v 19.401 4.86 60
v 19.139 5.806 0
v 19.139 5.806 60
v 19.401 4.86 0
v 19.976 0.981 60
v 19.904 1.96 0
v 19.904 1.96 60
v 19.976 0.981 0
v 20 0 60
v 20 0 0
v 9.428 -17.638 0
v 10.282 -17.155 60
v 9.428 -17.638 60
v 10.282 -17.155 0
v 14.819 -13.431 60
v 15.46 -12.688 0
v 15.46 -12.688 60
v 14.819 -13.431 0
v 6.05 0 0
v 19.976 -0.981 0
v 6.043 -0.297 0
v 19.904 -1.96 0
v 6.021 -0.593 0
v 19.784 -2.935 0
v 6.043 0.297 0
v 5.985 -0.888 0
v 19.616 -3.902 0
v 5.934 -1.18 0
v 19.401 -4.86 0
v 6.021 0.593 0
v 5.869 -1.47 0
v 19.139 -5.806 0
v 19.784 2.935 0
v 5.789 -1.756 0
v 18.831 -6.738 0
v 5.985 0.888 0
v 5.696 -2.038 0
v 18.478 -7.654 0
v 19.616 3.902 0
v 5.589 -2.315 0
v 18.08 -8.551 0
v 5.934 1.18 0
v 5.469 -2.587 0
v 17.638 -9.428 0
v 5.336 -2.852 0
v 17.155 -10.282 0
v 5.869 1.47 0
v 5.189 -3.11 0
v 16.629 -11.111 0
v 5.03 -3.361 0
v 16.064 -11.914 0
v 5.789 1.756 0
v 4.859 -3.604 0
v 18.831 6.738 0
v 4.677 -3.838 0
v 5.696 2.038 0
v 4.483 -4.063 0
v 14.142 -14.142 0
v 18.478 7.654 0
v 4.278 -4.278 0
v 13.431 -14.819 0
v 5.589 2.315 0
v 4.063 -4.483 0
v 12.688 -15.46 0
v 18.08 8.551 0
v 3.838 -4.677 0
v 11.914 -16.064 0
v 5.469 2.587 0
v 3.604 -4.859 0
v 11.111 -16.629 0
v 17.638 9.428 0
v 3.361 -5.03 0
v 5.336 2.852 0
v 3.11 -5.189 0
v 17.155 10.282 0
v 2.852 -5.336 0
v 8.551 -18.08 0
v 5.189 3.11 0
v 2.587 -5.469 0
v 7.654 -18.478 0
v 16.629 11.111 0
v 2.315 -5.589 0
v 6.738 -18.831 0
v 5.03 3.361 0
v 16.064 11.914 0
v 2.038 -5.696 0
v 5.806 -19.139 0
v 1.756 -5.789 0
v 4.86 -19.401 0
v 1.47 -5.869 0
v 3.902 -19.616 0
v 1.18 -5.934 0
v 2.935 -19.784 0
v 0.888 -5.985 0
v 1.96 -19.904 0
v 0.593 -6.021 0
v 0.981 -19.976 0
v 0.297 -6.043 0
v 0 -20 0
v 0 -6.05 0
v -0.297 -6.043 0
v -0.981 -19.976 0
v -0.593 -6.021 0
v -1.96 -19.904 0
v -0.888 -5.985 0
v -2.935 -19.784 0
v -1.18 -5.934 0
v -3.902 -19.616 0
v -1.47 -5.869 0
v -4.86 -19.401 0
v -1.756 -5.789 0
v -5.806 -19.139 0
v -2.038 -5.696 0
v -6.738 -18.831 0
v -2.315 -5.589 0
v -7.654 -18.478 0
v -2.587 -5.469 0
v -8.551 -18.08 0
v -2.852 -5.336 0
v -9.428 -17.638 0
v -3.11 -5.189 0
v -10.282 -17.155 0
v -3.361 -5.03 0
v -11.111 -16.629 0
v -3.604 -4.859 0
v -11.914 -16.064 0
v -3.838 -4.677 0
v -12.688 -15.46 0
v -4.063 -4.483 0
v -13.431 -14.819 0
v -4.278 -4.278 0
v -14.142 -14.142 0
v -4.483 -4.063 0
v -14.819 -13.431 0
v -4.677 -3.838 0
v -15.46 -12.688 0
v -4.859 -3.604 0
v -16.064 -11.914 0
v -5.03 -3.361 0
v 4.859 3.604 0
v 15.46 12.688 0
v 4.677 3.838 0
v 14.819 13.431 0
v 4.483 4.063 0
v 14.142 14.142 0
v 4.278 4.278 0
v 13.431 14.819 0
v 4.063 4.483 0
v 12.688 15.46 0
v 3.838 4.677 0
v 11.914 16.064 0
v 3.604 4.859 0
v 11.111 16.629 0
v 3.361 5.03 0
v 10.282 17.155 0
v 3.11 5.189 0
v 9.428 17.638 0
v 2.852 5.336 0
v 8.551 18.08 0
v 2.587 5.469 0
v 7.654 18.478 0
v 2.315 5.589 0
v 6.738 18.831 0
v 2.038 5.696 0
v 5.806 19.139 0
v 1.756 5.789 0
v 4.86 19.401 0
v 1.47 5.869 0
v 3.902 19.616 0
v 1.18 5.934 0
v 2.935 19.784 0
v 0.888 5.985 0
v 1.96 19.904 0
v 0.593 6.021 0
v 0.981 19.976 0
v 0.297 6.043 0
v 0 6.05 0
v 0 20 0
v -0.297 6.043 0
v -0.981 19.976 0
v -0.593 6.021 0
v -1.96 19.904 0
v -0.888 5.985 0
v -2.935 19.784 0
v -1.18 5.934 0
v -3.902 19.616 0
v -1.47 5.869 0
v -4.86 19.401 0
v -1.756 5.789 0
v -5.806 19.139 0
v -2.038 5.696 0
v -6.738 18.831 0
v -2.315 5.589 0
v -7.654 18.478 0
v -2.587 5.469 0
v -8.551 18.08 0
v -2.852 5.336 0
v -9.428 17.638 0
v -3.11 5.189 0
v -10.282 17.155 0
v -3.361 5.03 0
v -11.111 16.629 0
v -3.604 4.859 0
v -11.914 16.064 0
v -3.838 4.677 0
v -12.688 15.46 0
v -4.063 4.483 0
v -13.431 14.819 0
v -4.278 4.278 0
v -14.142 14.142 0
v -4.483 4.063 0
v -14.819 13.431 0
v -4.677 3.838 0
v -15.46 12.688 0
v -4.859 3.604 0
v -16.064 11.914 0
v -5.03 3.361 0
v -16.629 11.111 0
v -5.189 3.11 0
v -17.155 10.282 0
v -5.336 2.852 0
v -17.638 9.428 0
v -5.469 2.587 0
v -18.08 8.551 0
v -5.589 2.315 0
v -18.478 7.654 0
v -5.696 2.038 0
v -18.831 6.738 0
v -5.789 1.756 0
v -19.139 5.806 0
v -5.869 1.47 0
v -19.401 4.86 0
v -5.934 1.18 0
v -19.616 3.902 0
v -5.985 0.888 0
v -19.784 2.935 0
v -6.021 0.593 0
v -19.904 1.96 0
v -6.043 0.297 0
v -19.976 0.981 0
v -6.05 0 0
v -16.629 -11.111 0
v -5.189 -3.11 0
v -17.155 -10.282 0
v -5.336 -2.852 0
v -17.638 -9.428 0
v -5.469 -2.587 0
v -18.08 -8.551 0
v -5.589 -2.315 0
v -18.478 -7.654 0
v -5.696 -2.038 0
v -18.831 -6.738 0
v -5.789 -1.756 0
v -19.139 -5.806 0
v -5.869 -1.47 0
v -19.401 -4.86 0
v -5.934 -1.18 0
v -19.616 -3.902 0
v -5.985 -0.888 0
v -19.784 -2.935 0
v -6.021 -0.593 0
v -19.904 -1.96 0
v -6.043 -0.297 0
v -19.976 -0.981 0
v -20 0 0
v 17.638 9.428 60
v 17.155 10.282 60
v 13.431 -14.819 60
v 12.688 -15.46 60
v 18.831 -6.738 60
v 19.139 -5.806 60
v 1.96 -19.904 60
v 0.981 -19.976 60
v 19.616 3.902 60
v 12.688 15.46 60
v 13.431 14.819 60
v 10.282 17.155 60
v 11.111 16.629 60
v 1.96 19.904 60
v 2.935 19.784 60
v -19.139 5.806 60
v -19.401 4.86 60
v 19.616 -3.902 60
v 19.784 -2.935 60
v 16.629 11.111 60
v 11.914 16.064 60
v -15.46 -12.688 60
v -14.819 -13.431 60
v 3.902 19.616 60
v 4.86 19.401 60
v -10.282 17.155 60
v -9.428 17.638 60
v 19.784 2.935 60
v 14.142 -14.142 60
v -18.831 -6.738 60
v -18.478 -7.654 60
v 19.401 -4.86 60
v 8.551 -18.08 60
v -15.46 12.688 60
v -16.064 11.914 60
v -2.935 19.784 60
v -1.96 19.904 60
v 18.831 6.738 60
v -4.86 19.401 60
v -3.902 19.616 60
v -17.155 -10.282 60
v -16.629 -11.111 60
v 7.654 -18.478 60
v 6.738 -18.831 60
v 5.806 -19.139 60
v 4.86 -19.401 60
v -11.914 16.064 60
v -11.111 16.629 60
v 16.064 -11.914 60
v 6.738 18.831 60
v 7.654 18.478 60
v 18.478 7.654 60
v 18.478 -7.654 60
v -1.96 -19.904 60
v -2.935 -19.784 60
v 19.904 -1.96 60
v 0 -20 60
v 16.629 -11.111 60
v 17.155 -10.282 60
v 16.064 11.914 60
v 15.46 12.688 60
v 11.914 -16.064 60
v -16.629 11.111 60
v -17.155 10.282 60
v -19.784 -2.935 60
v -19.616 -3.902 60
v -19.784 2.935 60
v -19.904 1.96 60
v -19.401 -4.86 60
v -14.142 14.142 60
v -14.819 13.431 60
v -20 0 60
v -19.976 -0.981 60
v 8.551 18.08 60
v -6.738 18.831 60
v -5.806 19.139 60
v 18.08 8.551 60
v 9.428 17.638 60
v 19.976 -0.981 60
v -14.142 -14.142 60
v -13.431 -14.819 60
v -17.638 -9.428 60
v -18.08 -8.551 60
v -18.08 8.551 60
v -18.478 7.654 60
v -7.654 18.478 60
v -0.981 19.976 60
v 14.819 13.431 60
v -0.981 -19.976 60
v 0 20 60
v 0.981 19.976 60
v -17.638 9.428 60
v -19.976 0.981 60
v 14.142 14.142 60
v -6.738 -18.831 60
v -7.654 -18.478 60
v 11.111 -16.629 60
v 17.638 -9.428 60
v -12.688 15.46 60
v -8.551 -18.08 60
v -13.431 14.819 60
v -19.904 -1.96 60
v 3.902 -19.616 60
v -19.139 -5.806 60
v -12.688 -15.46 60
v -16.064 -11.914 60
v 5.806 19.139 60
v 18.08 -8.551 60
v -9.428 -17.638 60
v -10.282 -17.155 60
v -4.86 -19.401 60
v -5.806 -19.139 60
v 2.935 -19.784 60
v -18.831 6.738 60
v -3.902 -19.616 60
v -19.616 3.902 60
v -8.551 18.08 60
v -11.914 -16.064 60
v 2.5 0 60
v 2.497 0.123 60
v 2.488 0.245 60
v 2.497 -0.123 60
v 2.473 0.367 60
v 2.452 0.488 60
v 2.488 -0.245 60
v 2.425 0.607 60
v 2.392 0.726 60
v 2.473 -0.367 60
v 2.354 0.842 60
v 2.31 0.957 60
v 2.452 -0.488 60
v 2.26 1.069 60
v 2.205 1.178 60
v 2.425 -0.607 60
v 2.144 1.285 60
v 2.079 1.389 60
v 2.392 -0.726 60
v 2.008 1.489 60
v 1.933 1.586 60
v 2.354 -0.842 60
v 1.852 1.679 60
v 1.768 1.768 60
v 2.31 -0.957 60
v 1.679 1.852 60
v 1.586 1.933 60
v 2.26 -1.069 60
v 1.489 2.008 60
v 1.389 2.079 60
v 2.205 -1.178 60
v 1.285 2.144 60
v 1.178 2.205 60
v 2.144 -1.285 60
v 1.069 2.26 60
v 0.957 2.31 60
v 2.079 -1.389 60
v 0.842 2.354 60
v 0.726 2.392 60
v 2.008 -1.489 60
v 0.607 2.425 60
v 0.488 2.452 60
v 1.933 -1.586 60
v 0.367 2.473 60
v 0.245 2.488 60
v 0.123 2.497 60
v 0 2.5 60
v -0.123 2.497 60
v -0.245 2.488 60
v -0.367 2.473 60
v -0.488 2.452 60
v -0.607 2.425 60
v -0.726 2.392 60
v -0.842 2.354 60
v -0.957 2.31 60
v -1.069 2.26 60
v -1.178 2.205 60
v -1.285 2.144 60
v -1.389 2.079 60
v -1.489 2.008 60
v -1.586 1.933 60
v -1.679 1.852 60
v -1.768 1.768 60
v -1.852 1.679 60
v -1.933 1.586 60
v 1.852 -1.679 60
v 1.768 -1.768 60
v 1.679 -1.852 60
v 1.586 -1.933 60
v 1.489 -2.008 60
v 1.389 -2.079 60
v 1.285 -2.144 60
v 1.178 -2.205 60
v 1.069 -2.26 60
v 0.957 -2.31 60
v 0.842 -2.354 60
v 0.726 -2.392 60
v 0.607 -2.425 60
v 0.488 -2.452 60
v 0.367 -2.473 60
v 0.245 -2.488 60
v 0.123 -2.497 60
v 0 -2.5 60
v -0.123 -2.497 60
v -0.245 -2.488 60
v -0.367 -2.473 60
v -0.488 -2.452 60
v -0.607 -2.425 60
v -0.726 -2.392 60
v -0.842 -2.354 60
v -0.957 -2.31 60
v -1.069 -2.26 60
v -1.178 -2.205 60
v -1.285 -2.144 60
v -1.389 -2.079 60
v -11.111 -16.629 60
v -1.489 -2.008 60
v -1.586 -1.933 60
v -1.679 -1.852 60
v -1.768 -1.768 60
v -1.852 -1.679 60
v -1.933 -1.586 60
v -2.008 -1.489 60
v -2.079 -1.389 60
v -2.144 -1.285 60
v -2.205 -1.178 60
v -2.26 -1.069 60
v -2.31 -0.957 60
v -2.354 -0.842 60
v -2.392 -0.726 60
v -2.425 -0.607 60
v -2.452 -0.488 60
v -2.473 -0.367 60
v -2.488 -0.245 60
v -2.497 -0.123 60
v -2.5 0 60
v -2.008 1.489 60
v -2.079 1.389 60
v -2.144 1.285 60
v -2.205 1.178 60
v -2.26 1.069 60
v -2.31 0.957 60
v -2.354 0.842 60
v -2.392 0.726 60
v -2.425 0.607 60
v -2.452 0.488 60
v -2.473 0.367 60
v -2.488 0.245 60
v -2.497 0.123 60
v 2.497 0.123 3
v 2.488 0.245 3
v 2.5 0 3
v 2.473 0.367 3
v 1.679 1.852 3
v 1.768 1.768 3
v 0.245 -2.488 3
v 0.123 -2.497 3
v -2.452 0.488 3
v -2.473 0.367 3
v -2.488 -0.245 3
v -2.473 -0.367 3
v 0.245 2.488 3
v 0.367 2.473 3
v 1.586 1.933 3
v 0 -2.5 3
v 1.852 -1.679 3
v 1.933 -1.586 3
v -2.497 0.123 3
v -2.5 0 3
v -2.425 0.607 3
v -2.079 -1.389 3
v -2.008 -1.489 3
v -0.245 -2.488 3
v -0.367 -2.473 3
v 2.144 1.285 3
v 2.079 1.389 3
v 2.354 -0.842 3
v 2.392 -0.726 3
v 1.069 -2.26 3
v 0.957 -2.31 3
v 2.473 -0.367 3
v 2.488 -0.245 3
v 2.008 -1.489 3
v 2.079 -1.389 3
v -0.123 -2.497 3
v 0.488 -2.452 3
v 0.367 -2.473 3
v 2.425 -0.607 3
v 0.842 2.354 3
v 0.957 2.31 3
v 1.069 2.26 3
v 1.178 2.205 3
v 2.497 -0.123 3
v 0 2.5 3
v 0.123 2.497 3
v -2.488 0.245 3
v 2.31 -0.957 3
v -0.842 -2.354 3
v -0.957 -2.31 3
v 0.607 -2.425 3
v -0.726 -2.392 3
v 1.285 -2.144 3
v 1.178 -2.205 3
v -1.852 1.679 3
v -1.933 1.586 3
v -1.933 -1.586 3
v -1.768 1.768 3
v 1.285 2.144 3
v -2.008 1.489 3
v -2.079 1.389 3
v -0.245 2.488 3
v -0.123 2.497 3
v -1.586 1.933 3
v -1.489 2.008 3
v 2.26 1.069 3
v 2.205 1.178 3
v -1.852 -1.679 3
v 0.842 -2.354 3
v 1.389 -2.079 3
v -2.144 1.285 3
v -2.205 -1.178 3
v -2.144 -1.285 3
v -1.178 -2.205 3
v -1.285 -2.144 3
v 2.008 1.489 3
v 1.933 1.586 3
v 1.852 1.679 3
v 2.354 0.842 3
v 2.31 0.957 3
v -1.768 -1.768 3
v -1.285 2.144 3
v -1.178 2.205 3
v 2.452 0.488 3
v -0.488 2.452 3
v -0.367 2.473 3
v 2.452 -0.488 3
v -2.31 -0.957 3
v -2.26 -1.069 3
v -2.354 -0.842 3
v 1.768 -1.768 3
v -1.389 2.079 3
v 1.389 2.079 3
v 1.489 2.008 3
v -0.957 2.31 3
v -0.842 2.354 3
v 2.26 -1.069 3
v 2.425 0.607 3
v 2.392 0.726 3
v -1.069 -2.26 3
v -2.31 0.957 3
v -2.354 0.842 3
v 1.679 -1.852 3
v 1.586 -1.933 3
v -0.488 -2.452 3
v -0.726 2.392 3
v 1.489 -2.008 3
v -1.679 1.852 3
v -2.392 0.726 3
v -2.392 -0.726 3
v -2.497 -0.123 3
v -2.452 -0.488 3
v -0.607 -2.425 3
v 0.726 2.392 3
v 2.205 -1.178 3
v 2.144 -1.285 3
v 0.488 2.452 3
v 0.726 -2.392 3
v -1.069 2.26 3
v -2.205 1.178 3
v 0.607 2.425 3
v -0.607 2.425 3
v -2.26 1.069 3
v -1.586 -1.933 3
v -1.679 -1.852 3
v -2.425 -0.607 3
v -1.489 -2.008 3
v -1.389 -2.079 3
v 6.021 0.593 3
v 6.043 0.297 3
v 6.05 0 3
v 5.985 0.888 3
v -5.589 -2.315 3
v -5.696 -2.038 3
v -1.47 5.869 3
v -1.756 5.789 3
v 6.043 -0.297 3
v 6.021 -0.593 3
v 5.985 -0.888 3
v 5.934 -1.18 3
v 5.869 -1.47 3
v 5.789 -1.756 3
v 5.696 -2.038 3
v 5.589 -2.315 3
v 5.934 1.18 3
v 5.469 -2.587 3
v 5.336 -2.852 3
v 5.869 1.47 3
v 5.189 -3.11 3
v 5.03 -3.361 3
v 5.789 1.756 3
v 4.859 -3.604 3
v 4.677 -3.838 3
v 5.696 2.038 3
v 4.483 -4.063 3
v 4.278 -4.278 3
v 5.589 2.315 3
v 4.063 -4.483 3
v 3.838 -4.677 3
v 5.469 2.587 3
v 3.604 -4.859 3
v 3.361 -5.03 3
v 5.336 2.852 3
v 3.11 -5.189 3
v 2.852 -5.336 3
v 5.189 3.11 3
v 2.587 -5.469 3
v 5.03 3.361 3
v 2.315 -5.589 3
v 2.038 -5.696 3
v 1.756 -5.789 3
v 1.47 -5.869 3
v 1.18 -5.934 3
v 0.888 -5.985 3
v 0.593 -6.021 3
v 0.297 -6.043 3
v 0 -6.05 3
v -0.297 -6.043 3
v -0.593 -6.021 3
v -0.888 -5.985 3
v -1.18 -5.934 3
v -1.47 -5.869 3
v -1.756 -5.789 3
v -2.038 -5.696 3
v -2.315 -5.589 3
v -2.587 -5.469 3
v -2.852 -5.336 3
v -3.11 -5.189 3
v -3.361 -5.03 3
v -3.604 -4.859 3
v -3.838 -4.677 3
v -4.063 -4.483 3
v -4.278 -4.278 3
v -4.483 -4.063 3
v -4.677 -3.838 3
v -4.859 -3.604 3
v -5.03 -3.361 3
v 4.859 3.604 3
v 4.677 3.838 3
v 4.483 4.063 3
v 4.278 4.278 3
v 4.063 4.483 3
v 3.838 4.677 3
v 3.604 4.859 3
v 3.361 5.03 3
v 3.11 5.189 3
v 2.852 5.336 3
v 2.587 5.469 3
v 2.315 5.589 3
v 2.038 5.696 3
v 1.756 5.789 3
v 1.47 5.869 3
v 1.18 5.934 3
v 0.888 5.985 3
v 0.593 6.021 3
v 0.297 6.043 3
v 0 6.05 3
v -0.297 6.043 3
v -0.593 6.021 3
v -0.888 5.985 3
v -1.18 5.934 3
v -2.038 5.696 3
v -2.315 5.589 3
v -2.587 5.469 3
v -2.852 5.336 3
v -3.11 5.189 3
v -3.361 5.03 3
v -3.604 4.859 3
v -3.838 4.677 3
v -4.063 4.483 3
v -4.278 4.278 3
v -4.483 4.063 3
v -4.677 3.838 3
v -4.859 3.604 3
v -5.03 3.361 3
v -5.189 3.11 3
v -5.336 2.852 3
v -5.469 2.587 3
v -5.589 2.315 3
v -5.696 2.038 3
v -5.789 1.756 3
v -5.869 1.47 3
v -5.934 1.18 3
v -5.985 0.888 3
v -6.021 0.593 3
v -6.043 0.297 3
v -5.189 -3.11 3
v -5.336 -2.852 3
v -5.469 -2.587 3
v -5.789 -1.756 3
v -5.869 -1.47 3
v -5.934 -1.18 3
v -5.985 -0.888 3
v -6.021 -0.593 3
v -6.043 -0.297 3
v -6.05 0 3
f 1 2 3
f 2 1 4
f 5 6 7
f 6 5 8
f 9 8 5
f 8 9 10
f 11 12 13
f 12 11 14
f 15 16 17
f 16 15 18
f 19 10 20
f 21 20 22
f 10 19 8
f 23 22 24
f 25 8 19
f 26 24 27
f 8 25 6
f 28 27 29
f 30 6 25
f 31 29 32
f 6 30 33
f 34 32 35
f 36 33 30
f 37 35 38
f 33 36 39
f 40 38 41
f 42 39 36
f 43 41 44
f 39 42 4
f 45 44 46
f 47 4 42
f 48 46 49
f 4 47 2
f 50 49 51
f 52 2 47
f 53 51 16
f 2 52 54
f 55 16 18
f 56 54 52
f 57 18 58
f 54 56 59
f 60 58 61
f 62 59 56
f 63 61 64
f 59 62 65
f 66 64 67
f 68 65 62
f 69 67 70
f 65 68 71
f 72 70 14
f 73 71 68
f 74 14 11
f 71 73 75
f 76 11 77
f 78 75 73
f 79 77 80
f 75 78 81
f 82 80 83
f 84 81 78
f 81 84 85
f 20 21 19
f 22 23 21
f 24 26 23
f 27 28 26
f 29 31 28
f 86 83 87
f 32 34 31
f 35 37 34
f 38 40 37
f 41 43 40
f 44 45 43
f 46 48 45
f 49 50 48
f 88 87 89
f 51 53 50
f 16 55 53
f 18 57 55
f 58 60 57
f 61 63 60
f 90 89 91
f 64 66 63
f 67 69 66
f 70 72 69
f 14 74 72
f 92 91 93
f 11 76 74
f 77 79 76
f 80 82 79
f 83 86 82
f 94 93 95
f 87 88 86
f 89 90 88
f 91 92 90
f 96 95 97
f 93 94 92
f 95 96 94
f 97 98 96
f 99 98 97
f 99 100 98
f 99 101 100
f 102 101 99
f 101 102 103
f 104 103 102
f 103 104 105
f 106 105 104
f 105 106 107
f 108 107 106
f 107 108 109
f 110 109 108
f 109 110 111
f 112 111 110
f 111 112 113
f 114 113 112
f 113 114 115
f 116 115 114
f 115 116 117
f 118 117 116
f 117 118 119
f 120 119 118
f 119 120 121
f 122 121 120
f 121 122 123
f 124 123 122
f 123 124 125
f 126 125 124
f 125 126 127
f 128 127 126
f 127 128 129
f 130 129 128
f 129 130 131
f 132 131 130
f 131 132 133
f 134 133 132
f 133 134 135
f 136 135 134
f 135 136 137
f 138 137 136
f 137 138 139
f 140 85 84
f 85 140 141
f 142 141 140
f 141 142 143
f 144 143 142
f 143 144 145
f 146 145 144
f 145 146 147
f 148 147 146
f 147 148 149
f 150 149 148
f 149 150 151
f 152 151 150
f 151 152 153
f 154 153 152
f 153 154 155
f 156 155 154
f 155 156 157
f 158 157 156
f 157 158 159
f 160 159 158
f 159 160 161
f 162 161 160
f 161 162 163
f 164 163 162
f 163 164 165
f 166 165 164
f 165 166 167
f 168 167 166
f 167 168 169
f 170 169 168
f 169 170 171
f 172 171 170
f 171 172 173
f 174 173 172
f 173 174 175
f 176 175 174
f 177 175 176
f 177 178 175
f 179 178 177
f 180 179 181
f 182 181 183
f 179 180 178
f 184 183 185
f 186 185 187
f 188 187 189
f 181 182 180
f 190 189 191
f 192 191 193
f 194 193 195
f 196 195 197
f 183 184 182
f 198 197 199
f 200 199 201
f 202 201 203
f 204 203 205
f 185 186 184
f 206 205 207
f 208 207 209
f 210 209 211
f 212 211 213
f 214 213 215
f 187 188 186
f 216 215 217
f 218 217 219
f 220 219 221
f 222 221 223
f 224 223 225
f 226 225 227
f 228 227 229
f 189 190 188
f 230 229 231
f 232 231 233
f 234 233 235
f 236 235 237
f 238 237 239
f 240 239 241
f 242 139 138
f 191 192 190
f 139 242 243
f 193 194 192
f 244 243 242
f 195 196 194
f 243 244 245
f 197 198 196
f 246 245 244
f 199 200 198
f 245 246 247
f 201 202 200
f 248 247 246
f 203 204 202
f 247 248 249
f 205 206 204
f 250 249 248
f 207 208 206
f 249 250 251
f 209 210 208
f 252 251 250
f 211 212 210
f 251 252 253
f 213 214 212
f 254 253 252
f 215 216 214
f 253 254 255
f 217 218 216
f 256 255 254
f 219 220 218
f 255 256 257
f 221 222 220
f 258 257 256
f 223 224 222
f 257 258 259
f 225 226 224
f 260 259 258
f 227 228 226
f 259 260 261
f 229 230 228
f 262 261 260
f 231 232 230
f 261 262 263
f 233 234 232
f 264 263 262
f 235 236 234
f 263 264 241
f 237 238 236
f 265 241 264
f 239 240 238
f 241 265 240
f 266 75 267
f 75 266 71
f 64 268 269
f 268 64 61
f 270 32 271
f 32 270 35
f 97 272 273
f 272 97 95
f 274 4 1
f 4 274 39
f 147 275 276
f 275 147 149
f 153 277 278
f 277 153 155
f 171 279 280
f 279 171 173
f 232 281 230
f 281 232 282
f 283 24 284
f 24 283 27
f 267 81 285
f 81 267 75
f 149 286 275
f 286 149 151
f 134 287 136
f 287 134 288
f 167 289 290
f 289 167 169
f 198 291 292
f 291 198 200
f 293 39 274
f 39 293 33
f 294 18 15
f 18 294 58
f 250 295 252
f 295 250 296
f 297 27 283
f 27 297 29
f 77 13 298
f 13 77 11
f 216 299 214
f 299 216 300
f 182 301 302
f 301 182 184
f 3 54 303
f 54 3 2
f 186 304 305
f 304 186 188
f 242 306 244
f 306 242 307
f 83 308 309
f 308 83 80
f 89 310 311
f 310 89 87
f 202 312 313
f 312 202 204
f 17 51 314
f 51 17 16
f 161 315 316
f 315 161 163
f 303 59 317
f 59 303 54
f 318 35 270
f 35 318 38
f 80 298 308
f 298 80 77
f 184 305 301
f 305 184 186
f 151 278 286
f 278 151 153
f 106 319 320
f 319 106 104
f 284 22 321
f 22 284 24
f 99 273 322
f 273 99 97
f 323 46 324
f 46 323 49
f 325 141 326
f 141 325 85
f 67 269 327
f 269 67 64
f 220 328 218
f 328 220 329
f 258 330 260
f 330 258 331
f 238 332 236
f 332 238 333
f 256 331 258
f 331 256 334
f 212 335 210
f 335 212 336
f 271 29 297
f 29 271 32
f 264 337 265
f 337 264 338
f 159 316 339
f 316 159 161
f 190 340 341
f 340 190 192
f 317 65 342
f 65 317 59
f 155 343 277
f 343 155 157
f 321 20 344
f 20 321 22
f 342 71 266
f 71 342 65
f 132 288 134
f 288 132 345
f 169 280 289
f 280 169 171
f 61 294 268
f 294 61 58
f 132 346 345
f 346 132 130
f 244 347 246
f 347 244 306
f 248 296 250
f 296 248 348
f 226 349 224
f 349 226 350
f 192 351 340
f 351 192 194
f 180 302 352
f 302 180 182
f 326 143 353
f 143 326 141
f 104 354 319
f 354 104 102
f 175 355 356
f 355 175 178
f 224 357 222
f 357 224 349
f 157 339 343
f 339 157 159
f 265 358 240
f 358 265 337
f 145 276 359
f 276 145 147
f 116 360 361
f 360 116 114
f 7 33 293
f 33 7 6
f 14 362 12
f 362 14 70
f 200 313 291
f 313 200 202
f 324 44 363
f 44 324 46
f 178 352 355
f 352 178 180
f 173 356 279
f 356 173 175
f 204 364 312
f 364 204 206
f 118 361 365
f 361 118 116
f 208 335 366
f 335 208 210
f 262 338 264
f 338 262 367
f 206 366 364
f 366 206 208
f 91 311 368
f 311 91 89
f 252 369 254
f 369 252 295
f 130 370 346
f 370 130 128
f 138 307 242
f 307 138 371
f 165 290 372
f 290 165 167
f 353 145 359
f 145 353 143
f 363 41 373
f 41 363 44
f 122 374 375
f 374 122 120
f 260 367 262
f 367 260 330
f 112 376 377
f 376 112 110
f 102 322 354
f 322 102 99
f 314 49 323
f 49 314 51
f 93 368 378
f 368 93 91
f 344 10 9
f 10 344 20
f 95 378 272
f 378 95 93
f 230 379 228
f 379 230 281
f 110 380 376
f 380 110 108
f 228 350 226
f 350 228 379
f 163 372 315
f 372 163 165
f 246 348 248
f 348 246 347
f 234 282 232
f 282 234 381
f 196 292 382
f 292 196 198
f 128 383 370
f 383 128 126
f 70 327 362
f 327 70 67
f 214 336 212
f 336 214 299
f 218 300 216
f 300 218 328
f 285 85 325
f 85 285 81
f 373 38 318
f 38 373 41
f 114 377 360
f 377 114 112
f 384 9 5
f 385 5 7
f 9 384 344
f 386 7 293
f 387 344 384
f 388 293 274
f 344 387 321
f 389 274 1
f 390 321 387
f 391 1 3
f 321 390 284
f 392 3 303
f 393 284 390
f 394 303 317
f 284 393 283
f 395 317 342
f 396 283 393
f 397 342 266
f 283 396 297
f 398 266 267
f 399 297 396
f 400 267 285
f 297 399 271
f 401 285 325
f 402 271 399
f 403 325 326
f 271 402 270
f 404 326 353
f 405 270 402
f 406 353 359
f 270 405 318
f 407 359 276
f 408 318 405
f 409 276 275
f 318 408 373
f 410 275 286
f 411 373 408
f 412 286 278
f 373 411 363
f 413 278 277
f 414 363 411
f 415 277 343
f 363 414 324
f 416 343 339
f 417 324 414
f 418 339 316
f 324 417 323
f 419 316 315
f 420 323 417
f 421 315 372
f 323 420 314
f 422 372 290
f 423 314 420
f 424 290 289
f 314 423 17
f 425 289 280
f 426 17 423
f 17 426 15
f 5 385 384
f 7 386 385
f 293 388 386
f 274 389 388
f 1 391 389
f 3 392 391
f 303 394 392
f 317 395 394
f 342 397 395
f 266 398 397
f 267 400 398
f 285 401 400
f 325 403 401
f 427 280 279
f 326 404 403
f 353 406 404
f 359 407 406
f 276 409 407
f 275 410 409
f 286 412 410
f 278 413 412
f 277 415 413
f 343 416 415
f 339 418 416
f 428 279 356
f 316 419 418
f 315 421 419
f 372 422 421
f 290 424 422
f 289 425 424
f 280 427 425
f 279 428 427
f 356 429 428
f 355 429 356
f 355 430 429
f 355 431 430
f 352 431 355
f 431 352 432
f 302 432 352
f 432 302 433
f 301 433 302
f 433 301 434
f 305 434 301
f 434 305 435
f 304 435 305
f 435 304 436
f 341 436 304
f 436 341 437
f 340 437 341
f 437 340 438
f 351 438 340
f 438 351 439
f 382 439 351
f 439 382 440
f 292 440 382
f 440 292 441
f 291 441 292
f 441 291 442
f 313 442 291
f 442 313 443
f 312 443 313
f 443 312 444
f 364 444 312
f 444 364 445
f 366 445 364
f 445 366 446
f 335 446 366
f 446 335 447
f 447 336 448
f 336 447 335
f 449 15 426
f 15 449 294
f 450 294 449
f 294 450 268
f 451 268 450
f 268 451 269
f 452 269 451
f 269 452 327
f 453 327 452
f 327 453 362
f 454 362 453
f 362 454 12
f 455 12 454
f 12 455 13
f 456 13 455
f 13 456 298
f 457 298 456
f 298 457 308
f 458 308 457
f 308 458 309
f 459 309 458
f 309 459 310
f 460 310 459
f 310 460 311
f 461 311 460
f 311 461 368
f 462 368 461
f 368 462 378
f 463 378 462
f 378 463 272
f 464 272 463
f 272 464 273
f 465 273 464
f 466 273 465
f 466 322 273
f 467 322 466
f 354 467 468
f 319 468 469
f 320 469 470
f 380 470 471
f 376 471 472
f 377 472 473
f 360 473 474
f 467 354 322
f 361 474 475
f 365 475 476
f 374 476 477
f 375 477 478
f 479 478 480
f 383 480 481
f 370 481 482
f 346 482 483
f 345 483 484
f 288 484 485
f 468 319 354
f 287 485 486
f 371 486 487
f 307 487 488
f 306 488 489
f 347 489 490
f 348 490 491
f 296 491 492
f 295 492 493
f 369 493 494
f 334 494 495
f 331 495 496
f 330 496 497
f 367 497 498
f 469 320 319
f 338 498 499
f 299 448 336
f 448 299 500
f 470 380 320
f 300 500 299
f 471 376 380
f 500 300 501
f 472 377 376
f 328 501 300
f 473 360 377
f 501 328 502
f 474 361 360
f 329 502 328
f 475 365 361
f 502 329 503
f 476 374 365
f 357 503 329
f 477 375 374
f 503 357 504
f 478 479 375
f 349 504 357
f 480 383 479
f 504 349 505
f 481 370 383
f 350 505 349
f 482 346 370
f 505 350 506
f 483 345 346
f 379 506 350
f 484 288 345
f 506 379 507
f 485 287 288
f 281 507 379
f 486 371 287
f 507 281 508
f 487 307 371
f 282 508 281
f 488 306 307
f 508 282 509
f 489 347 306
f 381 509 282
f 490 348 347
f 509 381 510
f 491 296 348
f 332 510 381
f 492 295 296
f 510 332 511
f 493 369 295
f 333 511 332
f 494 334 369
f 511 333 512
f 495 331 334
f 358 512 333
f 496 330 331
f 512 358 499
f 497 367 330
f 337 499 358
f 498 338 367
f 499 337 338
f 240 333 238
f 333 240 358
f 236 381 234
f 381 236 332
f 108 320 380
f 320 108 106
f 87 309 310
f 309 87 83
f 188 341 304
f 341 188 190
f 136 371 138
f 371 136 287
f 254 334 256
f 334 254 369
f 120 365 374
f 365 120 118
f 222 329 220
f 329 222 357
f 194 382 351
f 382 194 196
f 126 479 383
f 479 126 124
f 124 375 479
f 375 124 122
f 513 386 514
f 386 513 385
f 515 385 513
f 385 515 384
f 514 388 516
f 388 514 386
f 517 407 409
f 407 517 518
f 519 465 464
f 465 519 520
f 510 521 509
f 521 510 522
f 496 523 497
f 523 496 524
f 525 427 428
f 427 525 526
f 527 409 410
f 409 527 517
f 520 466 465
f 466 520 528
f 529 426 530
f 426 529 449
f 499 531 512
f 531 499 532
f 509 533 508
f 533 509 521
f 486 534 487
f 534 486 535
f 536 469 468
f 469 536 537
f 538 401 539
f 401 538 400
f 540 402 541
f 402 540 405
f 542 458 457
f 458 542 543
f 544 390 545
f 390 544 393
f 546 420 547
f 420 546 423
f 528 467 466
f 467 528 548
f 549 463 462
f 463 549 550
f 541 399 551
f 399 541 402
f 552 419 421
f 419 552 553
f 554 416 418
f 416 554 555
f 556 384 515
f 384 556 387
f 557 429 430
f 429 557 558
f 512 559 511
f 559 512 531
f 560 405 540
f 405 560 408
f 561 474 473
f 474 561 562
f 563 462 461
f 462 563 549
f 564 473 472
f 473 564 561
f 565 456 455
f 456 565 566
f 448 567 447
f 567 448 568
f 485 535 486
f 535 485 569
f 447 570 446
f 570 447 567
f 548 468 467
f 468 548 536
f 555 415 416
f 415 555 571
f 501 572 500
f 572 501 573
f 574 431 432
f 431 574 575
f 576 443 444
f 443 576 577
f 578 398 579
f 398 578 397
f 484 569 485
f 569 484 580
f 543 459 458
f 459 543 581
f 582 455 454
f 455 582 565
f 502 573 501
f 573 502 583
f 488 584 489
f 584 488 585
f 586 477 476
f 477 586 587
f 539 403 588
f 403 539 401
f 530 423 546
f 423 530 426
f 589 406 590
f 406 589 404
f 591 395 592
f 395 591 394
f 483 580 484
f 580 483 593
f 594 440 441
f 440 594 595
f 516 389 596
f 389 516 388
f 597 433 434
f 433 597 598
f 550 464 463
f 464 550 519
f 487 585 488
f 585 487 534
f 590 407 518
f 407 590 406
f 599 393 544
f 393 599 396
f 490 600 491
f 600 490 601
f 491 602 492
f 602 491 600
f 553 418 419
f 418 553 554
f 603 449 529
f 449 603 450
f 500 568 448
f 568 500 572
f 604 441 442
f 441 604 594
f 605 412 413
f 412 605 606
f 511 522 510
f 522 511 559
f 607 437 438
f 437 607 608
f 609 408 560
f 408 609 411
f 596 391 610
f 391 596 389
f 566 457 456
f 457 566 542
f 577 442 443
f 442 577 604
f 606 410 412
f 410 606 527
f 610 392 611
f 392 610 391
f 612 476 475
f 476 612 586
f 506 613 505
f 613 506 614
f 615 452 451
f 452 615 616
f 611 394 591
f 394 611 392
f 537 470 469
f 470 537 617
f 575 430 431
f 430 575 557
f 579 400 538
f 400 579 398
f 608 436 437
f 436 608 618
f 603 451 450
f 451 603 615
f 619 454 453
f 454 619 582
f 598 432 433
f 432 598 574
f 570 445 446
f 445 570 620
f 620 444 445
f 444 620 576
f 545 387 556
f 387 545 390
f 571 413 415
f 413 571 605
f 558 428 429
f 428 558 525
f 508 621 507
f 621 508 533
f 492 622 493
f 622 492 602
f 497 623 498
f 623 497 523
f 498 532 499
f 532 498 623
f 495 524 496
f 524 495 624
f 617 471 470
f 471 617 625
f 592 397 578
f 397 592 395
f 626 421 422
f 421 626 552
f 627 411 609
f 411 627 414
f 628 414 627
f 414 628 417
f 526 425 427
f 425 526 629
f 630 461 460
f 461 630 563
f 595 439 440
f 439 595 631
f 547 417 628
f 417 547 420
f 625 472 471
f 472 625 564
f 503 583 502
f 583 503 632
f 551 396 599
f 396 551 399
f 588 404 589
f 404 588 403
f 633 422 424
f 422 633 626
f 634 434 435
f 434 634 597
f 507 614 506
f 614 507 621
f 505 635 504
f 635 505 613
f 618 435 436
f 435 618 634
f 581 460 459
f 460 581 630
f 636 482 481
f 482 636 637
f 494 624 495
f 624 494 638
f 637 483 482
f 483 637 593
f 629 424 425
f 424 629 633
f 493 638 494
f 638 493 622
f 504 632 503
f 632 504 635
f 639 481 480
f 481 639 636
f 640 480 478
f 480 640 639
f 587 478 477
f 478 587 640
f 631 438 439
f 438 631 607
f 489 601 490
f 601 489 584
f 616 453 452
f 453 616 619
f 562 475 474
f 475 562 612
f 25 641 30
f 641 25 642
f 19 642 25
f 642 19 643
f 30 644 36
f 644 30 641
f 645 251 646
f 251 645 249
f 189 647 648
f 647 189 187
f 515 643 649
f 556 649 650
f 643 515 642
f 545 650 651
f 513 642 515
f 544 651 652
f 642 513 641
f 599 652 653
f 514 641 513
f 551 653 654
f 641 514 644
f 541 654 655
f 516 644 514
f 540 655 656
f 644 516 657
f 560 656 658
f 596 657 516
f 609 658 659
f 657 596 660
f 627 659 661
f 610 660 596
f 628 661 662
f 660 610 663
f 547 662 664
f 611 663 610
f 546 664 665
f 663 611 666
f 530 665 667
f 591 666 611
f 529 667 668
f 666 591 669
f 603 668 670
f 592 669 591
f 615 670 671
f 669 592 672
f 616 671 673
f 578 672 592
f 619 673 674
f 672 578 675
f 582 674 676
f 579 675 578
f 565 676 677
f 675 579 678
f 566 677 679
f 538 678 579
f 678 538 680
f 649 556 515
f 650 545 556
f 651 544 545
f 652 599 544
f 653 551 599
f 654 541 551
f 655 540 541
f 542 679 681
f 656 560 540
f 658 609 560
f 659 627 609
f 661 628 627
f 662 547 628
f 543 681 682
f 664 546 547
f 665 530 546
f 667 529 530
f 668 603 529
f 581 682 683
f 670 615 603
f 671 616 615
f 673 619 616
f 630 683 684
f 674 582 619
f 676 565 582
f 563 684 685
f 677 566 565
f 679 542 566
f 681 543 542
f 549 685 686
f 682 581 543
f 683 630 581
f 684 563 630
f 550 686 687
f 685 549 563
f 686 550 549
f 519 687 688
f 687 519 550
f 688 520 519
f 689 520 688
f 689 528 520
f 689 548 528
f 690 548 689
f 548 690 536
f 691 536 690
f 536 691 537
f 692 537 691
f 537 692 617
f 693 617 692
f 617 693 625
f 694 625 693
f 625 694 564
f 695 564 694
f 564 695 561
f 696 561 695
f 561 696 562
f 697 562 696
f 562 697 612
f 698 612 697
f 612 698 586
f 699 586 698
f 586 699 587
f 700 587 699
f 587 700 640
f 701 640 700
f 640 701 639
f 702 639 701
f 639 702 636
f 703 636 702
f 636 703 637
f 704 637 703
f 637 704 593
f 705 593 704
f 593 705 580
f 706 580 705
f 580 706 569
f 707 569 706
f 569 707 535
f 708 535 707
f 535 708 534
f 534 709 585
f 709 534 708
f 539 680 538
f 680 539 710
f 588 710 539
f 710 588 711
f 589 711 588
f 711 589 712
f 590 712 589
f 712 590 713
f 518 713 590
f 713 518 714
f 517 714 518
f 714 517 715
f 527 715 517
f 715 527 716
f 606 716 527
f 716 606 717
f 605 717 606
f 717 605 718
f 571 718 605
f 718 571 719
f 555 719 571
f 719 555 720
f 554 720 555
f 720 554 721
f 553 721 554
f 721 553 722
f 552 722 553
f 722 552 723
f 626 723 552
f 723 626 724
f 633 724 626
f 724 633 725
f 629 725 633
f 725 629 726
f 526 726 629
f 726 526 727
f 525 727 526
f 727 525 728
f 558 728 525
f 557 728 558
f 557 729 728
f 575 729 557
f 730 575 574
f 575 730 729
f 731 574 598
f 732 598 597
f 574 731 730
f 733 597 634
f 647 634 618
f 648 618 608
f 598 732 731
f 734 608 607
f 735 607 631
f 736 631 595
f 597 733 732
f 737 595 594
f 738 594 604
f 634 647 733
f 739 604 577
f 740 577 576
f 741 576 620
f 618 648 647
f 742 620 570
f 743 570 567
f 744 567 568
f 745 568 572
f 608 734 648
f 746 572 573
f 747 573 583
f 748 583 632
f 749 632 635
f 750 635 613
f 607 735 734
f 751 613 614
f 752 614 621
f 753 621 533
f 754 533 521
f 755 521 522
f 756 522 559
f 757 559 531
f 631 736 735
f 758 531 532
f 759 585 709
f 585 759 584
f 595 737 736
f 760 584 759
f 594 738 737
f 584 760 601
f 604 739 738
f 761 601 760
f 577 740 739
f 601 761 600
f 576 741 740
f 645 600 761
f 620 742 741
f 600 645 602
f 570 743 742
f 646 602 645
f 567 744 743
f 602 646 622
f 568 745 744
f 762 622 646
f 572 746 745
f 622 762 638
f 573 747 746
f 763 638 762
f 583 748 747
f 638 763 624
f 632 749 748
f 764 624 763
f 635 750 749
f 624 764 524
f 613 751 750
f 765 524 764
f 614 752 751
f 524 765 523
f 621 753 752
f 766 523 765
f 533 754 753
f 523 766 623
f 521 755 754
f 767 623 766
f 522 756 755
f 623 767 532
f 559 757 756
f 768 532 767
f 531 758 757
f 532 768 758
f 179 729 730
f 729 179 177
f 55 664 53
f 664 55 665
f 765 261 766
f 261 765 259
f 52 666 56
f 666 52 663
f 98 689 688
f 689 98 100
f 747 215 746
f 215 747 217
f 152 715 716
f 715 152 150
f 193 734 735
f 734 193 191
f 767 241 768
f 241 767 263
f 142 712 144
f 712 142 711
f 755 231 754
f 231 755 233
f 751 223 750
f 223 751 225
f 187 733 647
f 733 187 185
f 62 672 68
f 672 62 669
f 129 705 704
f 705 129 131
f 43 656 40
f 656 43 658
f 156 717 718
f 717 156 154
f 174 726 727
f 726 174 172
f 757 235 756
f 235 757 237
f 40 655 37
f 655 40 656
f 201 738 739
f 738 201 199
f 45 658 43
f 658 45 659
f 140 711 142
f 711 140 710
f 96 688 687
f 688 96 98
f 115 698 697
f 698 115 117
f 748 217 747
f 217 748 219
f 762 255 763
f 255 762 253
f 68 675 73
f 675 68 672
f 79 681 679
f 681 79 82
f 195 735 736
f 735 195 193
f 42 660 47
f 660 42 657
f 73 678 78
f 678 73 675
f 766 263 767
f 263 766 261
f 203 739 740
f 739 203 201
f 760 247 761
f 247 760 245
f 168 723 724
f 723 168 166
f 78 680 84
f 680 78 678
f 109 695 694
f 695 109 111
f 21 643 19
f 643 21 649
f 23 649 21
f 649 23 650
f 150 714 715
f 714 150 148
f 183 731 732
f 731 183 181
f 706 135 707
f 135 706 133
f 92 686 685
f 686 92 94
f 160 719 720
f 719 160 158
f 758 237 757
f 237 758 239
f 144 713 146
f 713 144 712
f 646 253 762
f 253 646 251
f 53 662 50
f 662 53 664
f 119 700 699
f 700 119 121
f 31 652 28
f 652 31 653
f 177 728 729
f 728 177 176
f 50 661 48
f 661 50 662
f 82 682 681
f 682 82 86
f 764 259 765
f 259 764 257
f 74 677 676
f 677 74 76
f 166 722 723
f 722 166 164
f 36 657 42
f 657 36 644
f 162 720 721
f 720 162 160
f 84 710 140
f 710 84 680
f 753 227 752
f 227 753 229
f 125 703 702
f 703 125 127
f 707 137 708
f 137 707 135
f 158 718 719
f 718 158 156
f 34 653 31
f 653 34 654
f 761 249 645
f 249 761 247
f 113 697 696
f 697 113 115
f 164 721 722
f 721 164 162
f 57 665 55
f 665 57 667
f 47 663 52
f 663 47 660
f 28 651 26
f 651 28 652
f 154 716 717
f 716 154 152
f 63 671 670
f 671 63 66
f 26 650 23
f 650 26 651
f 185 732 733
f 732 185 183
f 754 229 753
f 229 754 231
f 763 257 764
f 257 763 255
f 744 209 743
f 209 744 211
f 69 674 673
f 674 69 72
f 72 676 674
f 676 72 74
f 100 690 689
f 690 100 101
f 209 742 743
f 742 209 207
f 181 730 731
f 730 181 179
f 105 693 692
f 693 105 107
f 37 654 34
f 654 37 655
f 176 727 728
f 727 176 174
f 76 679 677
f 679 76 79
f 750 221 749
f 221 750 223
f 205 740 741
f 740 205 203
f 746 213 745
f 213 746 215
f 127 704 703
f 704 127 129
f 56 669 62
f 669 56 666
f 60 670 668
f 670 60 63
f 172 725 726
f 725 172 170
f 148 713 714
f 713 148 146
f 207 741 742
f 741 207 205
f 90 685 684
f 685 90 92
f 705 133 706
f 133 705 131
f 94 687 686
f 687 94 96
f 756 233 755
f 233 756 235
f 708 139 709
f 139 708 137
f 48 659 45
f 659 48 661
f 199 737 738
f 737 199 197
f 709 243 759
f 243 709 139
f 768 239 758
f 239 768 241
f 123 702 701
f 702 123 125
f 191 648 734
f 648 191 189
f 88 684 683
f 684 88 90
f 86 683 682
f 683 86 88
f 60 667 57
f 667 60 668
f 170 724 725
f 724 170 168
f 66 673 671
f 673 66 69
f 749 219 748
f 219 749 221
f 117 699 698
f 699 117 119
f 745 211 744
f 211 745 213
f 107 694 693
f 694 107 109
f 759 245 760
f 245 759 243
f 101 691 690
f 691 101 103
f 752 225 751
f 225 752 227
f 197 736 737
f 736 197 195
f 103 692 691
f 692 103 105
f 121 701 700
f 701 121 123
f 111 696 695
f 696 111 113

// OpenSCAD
/* [Main Dimensions] */
baseDiameter = 40; // [10:0.1:60]
topDiameter = 40; // [10:0.1:40]

/* [Magnet Dimensions] */
magnetDiameter = 12.1; // [5:0.1:20]
magnetDepth = 3; // [1:0.1:5]

{} // Above this is intended to be user customizable; below are the model and variables not indended to be customized.

$fn=128;

difference() {
	cylinder(d1 = baseDiameter, d2 = topDiameter, h = 60);

	// Through-hole intended to help press the magnet (in case it needs to be removed)
	translate([0, 0, -0.1])
		cylinder(d = 5, h = 60.2);

	// Magnet pocket on the bottom face.
	cylinder(d = magnetDiameter, h = magnetDepth);
}
